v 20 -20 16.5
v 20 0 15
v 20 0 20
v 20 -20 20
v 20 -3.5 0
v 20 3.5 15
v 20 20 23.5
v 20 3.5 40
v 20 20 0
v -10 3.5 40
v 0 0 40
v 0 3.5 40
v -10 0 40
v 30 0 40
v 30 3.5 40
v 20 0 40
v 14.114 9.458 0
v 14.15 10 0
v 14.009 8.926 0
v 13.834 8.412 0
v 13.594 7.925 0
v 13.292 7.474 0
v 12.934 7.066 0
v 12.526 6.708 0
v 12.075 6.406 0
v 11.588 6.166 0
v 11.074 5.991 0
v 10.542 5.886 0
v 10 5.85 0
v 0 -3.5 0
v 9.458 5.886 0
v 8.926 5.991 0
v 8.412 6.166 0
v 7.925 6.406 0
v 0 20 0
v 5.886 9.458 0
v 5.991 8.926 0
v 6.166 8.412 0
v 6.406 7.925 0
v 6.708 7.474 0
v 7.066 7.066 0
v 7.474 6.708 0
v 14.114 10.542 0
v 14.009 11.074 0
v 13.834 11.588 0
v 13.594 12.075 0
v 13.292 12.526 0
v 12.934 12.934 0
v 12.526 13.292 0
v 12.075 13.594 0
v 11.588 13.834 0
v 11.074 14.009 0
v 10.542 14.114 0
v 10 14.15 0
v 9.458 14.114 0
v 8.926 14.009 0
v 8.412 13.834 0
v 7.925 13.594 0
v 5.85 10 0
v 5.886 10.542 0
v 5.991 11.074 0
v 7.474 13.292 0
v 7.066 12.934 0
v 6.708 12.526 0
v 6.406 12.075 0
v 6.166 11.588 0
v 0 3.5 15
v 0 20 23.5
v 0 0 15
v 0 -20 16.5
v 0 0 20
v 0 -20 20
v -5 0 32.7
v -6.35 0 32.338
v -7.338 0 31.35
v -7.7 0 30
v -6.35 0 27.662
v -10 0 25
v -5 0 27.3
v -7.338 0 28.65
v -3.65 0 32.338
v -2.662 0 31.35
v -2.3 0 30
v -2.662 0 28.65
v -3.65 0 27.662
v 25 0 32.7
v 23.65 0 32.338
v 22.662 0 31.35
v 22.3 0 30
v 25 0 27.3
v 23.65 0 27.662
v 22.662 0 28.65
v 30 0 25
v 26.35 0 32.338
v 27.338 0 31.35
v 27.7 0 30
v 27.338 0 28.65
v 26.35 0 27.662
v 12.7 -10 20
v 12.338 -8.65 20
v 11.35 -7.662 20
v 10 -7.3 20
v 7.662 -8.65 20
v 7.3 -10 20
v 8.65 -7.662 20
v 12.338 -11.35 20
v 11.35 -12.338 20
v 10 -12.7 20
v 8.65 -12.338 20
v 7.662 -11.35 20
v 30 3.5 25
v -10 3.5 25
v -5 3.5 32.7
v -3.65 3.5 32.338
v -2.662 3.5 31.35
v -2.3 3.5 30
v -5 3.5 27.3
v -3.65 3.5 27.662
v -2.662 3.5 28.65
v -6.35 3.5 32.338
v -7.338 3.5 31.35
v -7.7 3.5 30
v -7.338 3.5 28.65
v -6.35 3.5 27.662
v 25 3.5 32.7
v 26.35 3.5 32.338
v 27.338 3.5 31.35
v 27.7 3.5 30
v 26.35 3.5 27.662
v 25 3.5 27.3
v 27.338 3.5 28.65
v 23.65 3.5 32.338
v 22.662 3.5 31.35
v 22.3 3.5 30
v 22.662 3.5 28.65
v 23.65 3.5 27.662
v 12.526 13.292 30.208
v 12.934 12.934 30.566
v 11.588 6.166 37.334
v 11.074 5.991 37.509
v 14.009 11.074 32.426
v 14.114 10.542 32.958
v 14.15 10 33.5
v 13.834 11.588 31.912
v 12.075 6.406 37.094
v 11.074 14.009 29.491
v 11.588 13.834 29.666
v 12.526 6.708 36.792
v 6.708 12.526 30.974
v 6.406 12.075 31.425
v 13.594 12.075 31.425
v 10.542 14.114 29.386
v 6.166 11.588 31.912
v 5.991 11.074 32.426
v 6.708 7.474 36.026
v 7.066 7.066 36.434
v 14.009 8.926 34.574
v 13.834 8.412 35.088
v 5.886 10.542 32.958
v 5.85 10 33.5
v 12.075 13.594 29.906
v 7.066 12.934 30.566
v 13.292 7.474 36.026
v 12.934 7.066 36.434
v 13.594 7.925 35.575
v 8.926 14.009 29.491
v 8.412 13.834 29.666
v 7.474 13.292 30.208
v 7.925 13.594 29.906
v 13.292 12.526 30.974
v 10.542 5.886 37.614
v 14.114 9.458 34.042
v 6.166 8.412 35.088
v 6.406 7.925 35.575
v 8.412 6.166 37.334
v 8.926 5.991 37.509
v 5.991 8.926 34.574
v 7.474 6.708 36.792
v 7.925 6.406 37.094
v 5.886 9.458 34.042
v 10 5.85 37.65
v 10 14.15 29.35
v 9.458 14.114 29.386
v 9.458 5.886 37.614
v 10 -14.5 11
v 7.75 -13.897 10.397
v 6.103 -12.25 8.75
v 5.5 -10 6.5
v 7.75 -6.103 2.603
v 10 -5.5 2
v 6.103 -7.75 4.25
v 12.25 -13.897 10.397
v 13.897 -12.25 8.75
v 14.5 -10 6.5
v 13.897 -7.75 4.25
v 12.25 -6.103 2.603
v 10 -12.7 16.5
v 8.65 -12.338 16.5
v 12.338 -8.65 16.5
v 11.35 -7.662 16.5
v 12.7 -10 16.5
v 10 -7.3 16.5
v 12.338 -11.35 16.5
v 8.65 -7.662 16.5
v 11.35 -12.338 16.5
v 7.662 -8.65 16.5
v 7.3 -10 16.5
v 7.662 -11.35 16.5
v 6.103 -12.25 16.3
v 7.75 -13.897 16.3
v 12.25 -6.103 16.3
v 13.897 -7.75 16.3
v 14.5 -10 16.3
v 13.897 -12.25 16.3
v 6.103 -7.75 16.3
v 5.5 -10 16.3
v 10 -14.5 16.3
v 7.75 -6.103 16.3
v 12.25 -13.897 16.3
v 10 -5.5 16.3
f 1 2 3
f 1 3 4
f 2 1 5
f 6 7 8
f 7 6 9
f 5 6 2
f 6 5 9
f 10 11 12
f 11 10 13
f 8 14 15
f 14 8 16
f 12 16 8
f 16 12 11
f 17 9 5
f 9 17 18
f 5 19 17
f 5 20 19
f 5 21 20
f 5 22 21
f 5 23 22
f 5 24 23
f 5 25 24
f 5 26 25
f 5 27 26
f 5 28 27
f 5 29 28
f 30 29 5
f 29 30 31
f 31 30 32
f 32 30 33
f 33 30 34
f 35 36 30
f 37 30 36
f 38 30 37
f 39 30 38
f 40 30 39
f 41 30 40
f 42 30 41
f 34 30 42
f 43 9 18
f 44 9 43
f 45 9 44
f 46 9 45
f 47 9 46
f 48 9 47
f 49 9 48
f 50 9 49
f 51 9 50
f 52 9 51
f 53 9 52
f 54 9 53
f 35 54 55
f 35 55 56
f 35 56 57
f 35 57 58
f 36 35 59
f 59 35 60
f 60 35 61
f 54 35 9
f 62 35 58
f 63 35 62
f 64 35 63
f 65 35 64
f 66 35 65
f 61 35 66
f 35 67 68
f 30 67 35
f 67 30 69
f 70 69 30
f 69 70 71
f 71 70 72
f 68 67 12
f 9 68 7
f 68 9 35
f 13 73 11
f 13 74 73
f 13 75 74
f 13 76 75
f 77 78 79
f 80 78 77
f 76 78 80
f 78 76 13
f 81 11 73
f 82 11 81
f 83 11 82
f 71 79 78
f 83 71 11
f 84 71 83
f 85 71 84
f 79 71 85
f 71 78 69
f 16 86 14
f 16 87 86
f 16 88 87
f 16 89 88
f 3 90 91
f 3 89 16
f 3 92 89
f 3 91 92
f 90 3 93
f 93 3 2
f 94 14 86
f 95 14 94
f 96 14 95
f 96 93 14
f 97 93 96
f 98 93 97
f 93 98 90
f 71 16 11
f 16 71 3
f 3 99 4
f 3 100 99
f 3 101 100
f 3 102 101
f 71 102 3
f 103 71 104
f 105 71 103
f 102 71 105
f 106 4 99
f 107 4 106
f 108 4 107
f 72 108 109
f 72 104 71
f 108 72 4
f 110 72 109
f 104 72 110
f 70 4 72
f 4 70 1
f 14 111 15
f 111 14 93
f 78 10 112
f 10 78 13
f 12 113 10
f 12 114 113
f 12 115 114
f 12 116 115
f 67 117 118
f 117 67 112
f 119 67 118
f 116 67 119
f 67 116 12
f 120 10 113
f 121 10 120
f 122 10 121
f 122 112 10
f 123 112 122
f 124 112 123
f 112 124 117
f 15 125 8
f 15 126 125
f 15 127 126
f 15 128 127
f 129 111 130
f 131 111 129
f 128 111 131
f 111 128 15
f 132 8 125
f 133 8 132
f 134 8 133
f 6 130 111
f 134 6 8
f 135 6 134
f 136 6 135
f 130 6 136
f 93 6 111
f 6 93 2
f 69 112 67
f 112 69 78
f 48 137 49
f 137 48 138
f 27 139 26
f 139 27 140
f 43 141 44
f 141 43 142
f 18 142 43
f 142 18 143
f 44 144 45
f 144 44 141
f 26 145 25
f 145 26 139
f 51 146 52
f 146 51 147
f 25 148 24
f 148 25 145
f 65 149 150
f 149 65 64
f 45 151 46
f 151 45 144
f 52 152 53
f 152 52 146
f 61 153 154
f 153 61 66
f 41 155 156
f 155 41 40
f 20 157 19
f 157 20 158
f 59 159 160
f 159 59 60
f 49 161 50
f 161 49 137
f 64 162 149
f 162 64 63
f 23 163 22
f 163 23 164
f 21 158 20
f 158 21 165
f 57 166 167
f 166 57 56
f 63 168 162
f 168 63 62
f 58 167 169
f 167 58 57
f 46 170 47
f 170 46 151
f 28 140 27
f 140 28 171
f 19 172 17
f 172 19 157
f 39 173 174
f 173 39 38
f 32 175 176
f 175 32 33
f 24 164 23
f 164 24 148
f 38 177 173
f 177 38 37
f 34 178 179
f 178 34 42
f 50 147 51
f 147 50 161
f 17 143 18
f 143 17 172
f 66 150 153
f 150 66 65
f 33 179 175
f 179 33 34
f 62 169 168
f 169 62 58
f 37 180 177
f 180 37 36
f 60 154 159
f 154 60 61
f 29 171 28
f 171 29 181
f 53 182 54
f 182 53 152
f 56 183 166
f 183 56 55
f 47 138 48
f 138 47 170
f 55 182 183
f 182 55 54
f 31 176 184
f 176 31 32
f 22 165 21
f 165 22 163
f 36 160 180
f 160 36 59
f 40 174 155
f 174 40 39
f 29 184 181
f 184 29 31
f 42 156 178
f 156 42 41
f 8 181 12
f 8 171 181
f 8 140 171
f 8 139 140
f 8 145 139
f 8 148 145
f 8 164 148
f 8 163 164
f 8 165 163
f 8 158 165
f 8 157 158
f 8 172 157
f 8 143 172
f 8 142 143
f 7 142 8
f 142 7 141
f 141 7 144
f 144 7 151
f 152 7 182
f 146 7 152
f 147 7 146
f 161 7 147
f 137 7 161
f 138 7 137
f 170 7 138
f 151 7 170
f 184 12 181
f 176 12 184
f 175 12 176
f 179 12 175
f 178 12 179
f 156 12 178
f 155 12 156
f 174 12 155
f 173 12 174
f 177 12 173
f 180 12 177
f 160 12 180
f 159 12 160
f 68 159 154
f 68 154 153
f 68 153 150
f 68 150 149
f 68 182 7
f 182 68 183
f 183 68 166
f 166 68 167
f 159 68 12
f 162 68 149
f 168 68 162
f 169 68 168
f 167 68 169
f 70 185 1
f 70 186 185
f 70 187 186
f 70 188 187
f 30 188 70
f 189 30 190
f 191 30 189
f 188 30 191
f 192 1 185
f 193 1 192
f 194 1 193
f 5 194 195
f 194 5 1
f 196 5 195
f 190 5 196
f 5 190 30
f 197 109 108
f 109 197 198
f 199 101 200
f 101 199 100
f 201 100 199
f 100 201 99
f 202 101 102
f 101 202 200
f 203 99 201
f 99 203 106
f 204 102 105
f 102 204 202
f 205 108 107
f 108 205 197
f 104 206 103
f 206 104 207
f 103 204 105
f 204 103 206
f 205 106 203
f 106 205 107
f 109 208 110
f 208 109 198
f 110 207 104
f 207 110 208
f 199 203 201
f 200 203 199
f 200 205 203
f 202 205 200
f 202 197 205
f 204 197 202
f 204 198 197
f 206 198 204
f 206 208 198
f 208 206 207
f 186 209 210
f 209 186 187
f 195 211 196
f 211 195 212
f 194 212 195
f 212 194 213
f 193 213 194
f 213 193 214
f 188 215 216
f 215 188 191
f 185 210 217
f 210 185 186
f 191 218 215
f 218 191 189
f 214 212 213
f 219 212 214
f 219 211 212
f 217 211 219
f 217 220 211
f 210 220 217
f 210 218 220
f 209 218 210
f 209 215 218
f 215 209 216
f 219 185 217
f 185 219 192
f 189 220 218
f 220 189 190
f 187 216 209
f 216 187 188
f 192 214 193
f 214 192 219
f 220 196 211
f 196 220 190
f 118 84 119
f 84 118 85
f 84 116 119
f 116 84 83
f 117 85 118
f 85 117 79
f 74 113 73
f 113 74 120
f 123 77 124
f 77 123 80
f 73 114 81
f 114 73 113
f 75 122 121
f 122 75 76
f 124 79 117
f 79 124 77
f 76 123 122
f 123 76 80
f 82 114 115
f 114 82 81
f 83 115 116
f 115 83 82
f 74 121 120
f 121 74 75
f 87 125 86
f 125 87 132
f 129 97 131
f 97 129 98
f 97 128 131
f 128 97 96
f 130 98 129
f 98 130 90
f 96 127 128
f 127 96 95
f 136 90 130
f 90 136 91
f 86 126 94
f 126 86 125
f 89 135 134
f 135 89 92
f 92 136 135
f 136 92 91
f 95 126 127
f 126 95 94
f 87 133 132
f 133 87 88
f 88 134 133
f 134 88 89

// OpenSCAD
t=3.5;

difference()
{
    union()
    {
        cube([20,20,40]);
        
        translate([0,-20,0])
            cube([20,20,20]);
        
        translate([-10,0,25])
            cube([40,t,15]);
        
        translate([-10,0,25])
            rotate([0,45,0])
                cube([40/sqrt(2),t,40/sqrt(2)]);
        
        //rotate([45,0,0])
           // cube([20,20*sqrt(2),20*sqrt(2)]);
    }
    union()
    {
        translate([0,-20,20])
            cube([20,20,20]);
        
        translate([0,0,40])
            cube([20,20,20]);
        
        translate([10,10,0])
            cylinder(d=8.3,h=40,$fn=48);
        
        translate([0,20,20+t])
            rotate([45,0,0])
                cube([20,20*sqrt(2),20*sqrt(2)]);
        
        translate([0,-20,-20-t])
            rotate([45,0,0])
                cube([20,20*sqrt(2),20*sqrt(2)]);
        
        translate([10,-10,20-t])
            cylinder(d=5.4,h=t,$fn=12);
        translate([10,-10,0])
            cylinder(d=9,h=20-t-0.2,$fn=12);
        
        translate([-5,0,30])
            rotate([270,0,0])
                cylinder(d=5.4,h=t+1,$fn=12);
        translate([20+5,0,30])
            rotate([270,0,0])
                cylinder(d=5.4,h=t+1,$fn=12);
    }
}
